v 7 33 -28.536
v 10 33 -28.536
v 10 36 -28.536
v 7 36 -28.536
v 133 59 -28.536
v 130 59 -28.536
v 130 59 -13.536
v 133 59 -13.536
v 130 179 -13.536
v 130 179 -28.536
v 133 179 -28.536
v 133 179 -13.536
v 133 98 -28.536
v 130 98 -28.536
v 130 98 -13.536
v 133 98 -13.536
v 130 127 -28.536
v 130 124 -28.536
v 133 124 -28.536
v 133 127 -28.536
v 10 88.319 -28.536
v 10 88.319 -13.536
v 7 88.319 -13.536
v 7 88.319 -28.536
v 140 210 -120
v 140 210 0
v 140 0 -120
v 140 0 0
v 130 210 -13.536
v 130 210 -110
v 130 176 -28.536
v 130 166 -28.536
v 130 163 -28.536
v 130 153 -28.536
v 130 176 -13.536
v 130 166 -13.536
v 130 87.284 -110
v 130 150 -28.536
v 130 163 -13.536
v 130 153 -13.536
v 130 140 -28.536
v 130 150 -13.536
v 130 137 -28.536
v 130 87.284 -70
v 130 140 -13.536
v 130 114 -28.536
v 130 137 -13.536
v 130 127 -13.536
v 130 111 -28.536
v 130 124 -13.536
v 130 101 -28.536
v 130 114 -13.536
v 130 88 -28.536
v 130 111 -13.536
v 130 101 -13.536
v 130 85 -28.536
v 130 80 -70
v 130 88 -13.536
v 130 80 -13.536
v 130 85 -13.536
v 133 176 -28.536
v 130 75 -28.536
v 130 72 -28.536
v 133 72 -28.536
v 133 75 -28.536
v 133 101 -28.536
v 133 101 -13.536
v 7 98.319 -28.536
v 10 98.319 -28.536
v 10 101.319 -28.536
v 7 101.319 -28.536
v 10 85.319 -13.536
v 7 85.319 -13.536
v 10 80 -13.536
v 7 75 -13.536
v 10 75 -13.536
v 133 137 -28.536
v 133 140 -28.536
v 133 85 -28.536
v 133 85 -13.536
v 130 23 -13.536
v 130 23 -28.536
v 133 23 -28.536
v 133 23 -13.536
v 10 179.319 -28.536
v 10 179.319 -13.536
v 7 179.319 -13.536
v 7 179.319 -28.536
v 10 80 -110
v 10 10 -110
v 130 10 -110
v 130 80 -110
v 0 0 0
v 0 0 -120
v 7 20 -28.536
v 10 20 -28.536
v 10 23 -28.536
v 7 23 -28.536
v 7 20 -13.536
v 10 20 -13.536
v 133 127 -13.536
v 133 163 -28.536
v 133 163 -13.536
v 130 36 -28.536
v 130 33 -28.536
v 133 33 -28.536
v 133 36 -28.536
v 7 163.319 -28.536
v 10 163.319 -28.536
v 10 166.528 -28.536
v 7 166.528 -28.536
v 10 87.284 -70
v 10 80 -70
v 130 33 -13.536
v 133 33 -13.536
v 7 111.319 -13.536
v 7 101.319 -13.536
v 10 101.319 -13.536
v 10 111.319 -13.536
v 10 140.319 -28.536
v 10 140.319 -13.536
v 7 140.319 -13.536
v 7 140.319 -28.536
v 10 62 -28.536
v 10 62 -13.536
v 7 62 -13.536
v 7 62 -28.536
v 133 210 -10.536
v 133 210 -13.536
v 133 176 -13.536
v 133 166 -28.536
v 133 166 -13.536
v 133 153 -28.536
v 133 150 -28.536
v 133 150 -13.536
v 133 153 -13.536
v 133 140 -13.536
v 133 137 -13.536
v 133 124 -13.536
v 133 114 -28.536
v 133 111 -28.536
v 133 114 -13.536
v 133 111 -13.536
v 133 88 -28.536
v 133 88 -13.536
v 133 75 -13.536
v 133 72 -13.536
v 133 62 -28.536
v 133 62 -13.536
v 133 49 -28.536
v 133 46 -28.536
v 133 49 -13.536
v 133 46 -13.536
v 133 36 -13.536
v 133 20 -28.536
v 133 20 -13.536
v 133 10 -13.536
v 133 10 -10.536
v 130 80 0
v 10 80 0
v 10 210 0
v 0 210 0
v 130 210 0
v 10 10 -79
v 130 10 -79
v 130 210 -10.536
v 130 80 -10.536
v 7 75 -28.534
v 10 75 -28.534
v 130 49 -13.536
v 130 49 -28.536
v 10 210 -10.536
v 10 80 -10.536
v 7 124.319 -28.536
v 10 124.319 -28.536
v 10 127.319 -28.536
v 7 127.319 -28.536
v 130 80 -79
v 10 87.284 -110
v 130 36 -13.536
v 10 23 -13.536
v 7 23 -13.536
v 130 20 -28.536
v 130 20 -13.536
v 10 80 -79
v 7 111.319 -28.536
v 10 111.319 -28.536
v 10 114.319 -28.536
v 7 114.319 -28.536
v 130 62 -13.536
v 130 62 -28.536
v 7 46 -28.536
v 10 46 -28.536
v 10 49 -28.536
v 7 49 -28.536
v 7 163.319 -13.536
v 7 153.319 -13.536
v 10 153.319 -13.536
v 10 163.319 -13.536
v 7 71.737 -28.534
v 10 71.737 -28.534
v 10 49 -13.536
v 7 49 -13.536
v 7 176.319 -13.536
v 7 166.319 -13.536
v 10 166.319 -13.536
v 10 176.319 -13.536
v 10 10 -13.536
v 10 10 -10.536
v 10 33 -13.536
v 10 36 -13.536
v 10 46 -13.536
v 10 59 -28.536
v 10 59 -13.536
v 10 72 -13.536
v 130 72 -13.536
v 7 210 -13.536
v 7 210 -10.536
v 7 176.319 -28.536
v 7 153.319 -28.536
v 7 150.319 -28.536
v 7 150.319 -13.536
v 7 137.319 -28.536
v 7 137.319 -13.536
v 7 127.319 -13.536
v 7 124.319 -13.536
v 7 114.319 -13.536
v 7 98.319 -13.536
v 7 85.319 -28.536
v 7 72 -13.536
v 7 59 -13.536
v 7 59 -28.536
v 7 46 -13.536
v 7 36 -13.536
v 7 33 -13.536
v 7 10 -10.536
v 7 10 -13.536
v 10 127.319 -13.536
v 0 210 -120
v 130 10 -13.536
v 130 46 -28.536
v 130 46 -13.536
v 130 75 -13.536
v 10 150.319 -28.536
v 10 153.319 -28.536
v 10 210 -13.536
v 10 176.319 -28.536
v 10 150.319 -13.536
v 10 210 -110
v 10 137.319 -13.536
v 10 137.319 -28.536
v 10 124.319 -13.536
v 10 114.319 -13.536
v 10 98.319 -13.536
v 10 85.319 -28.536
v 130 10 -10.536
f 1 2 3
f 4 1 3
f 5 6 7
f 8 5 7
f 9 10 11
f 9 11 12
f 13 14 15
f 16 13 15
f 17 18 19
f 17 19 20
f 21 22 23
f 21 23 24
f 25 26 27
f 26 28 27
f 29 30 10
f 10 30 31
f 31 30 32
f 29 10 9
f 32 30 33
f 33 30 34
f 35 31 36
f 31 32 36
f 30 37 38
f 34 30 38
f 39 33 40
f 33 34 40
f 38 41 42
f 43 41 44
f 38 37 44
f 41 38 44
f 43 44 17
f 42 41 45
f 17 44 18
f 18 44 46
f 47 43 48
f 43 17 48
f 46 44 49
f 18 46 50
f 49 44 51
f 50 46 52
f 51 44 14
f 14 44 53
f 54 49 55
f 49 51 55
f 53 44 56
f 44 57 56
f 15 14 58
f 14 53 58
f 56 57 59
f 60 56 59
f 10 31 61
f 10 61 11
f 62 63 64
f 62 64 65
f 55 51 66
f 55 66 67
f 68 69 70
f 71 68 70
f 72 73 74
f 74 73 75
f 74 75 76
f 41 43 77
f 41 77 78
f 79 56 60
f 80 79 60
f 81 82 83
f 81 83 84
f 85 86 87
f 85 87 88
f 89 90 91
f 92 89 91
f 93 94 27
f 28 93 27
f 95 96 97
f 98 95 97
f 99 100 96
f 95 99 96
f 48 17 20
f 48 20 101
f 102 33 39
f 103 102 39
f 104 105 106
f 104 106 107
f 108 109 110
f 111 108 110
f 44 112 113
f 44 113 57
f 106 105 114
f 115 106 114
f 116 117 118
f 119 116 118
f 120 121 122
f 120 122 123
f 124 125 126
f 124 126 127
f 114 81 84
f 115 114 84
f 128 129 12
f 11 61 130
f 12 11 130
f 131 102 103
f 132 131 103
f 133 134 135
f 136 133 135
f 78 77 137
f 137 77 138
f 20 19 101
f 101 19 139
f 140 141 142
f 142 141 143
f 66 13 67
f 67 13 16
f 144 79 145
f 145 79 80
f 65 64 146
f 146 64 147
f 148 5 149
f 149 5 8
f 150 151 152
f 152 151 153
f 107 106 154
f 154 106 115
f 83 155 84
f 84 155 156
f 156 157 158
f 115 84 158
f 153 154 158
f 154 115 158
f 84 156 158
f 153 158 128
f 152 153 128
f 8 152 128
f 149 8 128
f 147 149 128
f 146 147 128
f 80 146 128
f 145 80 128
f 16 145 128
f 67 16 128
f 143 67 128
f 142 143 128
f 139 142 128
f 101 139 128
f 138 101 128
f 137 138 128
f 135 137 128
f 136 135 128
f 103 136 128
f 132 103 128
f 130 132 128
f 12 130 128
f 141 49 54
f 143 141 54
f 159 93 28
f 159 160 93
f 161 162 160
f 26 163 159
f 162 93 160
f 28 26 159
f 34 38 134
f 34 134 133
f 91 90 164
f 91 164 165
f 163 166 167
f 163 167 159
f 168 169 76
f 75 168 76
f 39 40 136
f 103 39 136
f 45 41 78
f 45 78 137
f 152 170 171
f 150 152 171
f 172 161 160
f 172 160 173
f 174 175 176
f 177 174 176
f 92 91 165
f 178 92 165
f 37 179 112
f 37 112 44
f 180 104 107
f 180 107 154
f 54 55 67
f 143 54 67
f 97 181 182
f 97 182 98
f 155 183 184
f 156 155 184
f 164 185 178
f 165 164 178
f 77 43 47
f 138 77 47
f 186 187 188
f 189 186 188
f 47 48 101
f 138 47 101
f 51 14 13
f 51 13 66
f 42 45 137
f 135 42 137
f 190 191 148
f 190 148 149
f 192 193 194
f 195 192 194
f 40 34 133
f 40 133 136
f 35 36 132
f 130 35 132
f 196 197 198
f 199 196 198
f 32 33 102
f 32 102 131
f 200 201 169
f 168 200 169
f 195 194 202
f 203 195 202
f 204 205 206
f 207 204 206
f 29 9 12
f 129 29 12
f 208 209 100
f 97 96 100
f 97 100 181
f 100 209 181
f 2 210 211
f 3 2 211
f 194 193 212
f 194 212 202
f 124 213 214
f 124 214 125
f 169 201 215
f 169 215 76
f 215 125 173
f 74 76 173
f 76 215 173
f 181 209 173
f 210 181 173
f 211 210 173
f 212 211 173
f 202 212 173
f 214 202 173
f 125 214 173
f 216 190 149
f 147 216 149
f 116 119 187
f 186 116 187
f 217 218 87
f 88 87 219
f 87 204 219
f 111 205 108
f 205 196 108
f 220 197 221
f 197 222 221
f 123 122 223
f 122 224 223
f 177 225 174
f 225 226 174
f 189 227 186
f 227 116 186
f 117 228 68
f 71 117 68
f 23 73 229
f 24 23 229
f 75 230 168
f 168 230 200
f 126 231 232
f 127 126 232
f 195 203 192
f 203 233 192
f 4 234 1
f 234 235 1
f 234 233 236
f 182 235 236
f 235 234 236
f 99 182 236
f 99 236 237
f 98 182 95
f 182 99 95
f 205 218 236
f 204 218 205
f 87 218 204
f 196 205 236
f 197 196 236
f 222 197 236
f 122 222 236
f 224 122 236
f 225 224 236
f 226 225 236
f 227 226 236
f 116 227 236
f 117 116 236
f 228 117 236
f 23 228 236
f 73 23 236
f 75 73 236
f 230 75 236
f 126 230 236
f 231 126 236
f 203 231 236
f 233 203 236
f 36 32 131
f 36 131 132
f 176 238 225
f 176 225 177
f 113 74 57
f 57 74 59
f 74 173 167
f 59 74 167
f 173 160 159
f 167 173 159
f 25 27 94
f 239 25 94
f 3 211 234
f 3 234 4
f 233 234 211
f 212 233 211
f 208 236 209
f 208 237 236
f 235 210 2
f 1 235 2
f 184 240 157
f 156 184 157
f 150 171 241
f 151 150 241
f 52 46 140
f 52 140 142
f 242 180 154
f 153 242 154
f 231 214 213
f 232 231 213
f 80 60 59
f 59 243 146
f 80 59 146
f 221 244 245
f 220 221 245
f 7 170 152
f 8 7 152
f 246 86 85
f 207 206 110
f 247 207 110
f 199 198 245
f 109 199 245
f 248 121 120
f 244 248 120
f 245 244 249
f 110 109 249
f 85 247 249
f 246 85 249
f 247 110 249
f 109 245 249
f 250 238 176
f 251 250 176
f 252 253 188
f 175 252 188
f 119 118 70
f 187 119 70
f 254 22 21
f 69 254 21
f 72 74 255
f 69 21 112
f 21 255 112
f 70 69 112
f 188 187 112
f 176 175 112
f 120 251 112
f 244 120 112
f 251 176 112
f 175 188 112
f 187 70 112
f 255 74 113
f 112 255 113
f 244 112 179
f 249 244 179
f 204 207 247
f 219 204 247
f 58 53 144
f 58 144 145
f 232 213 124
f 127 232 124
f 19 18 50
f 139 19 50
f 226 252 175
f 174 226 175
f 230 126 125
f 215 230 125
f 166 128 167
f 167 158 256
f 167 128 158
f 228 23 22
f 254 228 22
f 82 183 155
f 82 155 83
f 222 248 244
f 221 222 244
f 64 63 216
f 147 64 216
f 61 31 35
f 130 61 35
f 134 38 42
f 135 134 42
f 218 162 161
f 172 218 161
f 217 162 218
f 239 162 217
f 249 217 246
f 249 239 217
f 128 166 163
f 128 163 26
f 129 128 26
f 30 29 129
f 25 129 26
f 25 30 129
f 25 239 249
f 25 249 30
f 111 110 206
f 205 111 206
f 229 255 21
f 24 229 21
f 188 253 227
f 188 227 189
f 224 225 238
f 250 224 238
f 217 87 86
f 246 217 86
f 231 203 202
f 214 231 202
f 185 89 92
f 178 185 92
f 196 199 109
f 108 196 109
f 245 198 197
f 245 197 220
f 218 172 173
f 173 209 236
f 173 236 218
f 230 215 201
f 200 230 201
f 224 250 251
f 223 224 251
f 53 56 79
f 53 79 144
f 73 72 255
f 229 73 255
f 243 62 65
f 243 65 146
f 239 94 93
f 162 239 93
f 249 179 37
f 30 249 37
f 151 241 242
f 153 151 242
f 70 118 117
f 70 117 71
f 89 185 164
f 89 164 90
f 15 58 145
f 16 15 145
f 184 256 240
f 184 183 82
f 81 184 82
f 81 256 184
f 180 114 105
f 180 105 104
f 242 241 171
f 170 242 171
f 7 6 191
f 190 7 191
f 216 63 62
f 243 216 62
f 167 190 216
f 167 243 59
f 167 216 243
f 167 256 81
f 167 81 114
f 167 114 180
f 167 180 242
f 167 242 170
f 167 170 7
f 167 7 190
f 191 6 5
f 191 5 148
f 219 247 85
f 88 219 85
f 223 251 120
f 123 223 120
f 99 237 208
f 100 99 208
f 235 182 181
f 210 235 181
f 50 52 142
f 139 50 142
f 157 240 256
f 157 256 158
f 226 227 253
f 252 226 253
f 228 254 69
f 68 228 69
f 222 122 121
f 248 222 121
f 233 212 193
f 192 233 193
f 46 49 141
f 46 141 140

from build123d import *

# Parameters (mm, degrees)
SKETCH1_W           = 140
SKETCH1_H           = 120
BOSS_EXTRUDE1_DEPTH = 10
BOSS_EXTRUDE2_DEPTH = 200
SKETCH3_W           = 15
SKETCH3_H           = 3
CUT_EXTRUDE1_DEPTH  = 3
SKETCH4_W           = 15
SKETCH4_H           = 3
CUT_EXTRUDE2_DEPTH  = 3
SKETCH5_W           = 120
SKETCH5_H           = 7.283967232
BOSS_EXTRUDE3_DEPTH = 40
SKETCH6_W           = 120
SKETCH6_H           = 70
BOSS_EXTRUDE4_DEPTH = 79


with BuildPart() as part:
    # Sketch1 → Boss-Extrude1 (new body)
    with BuildSketch(Plane(origin=(0, 0, 0), x_dir=(1, 0, 0), z_dir=(0, 1, 0))):
        with Locations((70, 60)):
            Rectangle(SKETCH1_W, SKETCH1_H)
    extrude(amount=BOSS_EXTRUDE1_DEPTH)

    # Sketch2 → Boss-Extrude2 (add)
    with BuildSketch(Plane(origin=(0, 10, 0), x_dir=(1, 0, 0), z_dir=(0, 1, 0))):
        Polygon((0, 120), (0, 0), (10, 0), (10, 10.536291888), (7, 10.536291888), (7, 13.536291888), (10, 13.536291888), (10, 110), (70, 110), (70, 120), align=None)
        Polygon((130, 10.536291888), (130, 0), (140, 0), (140, 120), (70, 120), (70, 110), (130, 110), (130, 13.536291888), (133, 13.536291888), (133, 10.536291888), align=None)
    extrude(amount=BOSS_EXTRUDE2_DEPTH)

    # Sketch3 → Cut-Extrude1 (cut)
    with BuildSketch(Plane(origin=(10, 0, 0), x_dir=(0, 0, -1), z_dir=(1, 0, 0))):
        with Locations((21.036291888, 177.819120876)):
            Rectangle(SKETCH3_W, SKETCH3_H)
        Polygon((13.536291888, 166.319120876), (13.536291888, 163.319120876), (28.536291888, 163.319120876), (28.536291888, 166.527780645), align=None)
        with Locations((21.036291888, 151.819120876)):
            Rectangle(SKETCH3_W, SKETCH3_H)
        with Locations((21.036291888, 138.819120876)):
            Rectangle(SKETCH3_W, SKETCH3_H)
        with Locations((21.036291888, 125.819120876)):
            Rectangle(SKETCH3_W, SKETCH3_H)
        with Locations((21.036291888, 112.819120876)):
            Rectangle(SKETCH3_W, SKETCH3_H)
        with Locations((21.036291888, 99.819120876)):
            Rectangle(SKETCH3_W, SKETCH3_H)
        with Locations((21.036291888, 86.819120876)):
            Rectangle(SKETCH3_W, SKETCH3_H)
        Polygon((13.536291888, 75), (13.536291888, 72), (28.533994657, 71.737489743), (28.533994657, 75), align=None)
        with Locations((21.036291888, 60.5)):
            Rectangle(SKETCH3_W, SKETCH3_H)
        Polygon((13.536291888, 49), (13.536291888, 46), (28.536291888, 46), (28.536291888, 49), (13.757115753, 49), align=None)
        with Locations((21.036291888, 34.5)):
            Rectangle(SKETCH3_W, SKETCH3_H)
        with Locations((21.036291888, 21.5)):
            Rectangle(SKETCH3_W, SKETCH3_H)
    extrude(amount=-CUT_EXTRUDE1_DEPTH, mode=Mode.SUBTRACT)

    # Sketch4 → Cut-Extrude2 (cut)
    with BuildSketch(Plane.ZY.offset(-130)):
        with Locations((-21.036291888, 21.5)):
            Rectangle(SKETCH4_W, SKETCH4_H)
        with Locations((-21.036291888, 34.5)):
            Rectangle(SKETCH4_W, SKETCH4_H)
        Polygon((-18.143826221, 46), (-13.536291888, 46), (-13.536291888, 49), (-28.536291888, 49), (-28.536291888, 46), align=None)
        with Locations((-21.036291888, 60.5)):
            Rectangle(SKETCH4_W, SKETCH4_H)
        with Locations((-21.036291888, 73.5)):
            Rectangle(SKETCH4_W, SKETCH4_H)
        with Locations((-21.036291888, 86.5)):
            Rectangle(SKETCH4_W, SKETCH4_H)
        with Locations((-21.036291888, 99.5)):
            Rectangle(SKETCH4_W, SKETCH4_H)
        with Locations((-21.036291888, 112.5)):
            Rectangle(SKETCH4_W, SKETCH4_H)
        with Locations((-21.036291888, 125.5)):
            Rectangle(SKETCH4_W, SKETCH4_H)
        with Locations((-21.036291888, 138.5)):
            Rectangle(SKETCH4_W, SKETCH4_H)
        with Locations((-21.036291888, 151.5)):
            Rectangle(SKETCH4_W, SKETCH4_H)
        with Locations((-21.036291888, 164.5)):
            Rectangle(SKETCH4_W, SKETCH4_H)
        with Locations((-21.036291888, 177.5)):
            Rectangle(SKETCH4_W, SKETCH4_H)
    extrude(amount=-CUT_EXTRUDE2_DEPTH, mode=Mode.SUBTRACT)

    # Sketch5 → Boss-Extrude3 (add)
    with BuildSketch(Plane.XY.offset(-110)):
        with Locations((70, 83.641983616)):
            Rectangle(SKETCH5_W, SKETCH5_H)
    extrude(amount=BOSS_EXTRUDE3_DEPTH)

    # Sketch6 → Boss-Extrude4 (add)
    with BuildSketch(Plane.XY):
        with Locations((70, 45)):
            Rectangle(SKETCH6_W, SKETCH6_H)
    extrude(amount=-BOSS_EXTRUDE4_DEPTH)


solid = part.part
